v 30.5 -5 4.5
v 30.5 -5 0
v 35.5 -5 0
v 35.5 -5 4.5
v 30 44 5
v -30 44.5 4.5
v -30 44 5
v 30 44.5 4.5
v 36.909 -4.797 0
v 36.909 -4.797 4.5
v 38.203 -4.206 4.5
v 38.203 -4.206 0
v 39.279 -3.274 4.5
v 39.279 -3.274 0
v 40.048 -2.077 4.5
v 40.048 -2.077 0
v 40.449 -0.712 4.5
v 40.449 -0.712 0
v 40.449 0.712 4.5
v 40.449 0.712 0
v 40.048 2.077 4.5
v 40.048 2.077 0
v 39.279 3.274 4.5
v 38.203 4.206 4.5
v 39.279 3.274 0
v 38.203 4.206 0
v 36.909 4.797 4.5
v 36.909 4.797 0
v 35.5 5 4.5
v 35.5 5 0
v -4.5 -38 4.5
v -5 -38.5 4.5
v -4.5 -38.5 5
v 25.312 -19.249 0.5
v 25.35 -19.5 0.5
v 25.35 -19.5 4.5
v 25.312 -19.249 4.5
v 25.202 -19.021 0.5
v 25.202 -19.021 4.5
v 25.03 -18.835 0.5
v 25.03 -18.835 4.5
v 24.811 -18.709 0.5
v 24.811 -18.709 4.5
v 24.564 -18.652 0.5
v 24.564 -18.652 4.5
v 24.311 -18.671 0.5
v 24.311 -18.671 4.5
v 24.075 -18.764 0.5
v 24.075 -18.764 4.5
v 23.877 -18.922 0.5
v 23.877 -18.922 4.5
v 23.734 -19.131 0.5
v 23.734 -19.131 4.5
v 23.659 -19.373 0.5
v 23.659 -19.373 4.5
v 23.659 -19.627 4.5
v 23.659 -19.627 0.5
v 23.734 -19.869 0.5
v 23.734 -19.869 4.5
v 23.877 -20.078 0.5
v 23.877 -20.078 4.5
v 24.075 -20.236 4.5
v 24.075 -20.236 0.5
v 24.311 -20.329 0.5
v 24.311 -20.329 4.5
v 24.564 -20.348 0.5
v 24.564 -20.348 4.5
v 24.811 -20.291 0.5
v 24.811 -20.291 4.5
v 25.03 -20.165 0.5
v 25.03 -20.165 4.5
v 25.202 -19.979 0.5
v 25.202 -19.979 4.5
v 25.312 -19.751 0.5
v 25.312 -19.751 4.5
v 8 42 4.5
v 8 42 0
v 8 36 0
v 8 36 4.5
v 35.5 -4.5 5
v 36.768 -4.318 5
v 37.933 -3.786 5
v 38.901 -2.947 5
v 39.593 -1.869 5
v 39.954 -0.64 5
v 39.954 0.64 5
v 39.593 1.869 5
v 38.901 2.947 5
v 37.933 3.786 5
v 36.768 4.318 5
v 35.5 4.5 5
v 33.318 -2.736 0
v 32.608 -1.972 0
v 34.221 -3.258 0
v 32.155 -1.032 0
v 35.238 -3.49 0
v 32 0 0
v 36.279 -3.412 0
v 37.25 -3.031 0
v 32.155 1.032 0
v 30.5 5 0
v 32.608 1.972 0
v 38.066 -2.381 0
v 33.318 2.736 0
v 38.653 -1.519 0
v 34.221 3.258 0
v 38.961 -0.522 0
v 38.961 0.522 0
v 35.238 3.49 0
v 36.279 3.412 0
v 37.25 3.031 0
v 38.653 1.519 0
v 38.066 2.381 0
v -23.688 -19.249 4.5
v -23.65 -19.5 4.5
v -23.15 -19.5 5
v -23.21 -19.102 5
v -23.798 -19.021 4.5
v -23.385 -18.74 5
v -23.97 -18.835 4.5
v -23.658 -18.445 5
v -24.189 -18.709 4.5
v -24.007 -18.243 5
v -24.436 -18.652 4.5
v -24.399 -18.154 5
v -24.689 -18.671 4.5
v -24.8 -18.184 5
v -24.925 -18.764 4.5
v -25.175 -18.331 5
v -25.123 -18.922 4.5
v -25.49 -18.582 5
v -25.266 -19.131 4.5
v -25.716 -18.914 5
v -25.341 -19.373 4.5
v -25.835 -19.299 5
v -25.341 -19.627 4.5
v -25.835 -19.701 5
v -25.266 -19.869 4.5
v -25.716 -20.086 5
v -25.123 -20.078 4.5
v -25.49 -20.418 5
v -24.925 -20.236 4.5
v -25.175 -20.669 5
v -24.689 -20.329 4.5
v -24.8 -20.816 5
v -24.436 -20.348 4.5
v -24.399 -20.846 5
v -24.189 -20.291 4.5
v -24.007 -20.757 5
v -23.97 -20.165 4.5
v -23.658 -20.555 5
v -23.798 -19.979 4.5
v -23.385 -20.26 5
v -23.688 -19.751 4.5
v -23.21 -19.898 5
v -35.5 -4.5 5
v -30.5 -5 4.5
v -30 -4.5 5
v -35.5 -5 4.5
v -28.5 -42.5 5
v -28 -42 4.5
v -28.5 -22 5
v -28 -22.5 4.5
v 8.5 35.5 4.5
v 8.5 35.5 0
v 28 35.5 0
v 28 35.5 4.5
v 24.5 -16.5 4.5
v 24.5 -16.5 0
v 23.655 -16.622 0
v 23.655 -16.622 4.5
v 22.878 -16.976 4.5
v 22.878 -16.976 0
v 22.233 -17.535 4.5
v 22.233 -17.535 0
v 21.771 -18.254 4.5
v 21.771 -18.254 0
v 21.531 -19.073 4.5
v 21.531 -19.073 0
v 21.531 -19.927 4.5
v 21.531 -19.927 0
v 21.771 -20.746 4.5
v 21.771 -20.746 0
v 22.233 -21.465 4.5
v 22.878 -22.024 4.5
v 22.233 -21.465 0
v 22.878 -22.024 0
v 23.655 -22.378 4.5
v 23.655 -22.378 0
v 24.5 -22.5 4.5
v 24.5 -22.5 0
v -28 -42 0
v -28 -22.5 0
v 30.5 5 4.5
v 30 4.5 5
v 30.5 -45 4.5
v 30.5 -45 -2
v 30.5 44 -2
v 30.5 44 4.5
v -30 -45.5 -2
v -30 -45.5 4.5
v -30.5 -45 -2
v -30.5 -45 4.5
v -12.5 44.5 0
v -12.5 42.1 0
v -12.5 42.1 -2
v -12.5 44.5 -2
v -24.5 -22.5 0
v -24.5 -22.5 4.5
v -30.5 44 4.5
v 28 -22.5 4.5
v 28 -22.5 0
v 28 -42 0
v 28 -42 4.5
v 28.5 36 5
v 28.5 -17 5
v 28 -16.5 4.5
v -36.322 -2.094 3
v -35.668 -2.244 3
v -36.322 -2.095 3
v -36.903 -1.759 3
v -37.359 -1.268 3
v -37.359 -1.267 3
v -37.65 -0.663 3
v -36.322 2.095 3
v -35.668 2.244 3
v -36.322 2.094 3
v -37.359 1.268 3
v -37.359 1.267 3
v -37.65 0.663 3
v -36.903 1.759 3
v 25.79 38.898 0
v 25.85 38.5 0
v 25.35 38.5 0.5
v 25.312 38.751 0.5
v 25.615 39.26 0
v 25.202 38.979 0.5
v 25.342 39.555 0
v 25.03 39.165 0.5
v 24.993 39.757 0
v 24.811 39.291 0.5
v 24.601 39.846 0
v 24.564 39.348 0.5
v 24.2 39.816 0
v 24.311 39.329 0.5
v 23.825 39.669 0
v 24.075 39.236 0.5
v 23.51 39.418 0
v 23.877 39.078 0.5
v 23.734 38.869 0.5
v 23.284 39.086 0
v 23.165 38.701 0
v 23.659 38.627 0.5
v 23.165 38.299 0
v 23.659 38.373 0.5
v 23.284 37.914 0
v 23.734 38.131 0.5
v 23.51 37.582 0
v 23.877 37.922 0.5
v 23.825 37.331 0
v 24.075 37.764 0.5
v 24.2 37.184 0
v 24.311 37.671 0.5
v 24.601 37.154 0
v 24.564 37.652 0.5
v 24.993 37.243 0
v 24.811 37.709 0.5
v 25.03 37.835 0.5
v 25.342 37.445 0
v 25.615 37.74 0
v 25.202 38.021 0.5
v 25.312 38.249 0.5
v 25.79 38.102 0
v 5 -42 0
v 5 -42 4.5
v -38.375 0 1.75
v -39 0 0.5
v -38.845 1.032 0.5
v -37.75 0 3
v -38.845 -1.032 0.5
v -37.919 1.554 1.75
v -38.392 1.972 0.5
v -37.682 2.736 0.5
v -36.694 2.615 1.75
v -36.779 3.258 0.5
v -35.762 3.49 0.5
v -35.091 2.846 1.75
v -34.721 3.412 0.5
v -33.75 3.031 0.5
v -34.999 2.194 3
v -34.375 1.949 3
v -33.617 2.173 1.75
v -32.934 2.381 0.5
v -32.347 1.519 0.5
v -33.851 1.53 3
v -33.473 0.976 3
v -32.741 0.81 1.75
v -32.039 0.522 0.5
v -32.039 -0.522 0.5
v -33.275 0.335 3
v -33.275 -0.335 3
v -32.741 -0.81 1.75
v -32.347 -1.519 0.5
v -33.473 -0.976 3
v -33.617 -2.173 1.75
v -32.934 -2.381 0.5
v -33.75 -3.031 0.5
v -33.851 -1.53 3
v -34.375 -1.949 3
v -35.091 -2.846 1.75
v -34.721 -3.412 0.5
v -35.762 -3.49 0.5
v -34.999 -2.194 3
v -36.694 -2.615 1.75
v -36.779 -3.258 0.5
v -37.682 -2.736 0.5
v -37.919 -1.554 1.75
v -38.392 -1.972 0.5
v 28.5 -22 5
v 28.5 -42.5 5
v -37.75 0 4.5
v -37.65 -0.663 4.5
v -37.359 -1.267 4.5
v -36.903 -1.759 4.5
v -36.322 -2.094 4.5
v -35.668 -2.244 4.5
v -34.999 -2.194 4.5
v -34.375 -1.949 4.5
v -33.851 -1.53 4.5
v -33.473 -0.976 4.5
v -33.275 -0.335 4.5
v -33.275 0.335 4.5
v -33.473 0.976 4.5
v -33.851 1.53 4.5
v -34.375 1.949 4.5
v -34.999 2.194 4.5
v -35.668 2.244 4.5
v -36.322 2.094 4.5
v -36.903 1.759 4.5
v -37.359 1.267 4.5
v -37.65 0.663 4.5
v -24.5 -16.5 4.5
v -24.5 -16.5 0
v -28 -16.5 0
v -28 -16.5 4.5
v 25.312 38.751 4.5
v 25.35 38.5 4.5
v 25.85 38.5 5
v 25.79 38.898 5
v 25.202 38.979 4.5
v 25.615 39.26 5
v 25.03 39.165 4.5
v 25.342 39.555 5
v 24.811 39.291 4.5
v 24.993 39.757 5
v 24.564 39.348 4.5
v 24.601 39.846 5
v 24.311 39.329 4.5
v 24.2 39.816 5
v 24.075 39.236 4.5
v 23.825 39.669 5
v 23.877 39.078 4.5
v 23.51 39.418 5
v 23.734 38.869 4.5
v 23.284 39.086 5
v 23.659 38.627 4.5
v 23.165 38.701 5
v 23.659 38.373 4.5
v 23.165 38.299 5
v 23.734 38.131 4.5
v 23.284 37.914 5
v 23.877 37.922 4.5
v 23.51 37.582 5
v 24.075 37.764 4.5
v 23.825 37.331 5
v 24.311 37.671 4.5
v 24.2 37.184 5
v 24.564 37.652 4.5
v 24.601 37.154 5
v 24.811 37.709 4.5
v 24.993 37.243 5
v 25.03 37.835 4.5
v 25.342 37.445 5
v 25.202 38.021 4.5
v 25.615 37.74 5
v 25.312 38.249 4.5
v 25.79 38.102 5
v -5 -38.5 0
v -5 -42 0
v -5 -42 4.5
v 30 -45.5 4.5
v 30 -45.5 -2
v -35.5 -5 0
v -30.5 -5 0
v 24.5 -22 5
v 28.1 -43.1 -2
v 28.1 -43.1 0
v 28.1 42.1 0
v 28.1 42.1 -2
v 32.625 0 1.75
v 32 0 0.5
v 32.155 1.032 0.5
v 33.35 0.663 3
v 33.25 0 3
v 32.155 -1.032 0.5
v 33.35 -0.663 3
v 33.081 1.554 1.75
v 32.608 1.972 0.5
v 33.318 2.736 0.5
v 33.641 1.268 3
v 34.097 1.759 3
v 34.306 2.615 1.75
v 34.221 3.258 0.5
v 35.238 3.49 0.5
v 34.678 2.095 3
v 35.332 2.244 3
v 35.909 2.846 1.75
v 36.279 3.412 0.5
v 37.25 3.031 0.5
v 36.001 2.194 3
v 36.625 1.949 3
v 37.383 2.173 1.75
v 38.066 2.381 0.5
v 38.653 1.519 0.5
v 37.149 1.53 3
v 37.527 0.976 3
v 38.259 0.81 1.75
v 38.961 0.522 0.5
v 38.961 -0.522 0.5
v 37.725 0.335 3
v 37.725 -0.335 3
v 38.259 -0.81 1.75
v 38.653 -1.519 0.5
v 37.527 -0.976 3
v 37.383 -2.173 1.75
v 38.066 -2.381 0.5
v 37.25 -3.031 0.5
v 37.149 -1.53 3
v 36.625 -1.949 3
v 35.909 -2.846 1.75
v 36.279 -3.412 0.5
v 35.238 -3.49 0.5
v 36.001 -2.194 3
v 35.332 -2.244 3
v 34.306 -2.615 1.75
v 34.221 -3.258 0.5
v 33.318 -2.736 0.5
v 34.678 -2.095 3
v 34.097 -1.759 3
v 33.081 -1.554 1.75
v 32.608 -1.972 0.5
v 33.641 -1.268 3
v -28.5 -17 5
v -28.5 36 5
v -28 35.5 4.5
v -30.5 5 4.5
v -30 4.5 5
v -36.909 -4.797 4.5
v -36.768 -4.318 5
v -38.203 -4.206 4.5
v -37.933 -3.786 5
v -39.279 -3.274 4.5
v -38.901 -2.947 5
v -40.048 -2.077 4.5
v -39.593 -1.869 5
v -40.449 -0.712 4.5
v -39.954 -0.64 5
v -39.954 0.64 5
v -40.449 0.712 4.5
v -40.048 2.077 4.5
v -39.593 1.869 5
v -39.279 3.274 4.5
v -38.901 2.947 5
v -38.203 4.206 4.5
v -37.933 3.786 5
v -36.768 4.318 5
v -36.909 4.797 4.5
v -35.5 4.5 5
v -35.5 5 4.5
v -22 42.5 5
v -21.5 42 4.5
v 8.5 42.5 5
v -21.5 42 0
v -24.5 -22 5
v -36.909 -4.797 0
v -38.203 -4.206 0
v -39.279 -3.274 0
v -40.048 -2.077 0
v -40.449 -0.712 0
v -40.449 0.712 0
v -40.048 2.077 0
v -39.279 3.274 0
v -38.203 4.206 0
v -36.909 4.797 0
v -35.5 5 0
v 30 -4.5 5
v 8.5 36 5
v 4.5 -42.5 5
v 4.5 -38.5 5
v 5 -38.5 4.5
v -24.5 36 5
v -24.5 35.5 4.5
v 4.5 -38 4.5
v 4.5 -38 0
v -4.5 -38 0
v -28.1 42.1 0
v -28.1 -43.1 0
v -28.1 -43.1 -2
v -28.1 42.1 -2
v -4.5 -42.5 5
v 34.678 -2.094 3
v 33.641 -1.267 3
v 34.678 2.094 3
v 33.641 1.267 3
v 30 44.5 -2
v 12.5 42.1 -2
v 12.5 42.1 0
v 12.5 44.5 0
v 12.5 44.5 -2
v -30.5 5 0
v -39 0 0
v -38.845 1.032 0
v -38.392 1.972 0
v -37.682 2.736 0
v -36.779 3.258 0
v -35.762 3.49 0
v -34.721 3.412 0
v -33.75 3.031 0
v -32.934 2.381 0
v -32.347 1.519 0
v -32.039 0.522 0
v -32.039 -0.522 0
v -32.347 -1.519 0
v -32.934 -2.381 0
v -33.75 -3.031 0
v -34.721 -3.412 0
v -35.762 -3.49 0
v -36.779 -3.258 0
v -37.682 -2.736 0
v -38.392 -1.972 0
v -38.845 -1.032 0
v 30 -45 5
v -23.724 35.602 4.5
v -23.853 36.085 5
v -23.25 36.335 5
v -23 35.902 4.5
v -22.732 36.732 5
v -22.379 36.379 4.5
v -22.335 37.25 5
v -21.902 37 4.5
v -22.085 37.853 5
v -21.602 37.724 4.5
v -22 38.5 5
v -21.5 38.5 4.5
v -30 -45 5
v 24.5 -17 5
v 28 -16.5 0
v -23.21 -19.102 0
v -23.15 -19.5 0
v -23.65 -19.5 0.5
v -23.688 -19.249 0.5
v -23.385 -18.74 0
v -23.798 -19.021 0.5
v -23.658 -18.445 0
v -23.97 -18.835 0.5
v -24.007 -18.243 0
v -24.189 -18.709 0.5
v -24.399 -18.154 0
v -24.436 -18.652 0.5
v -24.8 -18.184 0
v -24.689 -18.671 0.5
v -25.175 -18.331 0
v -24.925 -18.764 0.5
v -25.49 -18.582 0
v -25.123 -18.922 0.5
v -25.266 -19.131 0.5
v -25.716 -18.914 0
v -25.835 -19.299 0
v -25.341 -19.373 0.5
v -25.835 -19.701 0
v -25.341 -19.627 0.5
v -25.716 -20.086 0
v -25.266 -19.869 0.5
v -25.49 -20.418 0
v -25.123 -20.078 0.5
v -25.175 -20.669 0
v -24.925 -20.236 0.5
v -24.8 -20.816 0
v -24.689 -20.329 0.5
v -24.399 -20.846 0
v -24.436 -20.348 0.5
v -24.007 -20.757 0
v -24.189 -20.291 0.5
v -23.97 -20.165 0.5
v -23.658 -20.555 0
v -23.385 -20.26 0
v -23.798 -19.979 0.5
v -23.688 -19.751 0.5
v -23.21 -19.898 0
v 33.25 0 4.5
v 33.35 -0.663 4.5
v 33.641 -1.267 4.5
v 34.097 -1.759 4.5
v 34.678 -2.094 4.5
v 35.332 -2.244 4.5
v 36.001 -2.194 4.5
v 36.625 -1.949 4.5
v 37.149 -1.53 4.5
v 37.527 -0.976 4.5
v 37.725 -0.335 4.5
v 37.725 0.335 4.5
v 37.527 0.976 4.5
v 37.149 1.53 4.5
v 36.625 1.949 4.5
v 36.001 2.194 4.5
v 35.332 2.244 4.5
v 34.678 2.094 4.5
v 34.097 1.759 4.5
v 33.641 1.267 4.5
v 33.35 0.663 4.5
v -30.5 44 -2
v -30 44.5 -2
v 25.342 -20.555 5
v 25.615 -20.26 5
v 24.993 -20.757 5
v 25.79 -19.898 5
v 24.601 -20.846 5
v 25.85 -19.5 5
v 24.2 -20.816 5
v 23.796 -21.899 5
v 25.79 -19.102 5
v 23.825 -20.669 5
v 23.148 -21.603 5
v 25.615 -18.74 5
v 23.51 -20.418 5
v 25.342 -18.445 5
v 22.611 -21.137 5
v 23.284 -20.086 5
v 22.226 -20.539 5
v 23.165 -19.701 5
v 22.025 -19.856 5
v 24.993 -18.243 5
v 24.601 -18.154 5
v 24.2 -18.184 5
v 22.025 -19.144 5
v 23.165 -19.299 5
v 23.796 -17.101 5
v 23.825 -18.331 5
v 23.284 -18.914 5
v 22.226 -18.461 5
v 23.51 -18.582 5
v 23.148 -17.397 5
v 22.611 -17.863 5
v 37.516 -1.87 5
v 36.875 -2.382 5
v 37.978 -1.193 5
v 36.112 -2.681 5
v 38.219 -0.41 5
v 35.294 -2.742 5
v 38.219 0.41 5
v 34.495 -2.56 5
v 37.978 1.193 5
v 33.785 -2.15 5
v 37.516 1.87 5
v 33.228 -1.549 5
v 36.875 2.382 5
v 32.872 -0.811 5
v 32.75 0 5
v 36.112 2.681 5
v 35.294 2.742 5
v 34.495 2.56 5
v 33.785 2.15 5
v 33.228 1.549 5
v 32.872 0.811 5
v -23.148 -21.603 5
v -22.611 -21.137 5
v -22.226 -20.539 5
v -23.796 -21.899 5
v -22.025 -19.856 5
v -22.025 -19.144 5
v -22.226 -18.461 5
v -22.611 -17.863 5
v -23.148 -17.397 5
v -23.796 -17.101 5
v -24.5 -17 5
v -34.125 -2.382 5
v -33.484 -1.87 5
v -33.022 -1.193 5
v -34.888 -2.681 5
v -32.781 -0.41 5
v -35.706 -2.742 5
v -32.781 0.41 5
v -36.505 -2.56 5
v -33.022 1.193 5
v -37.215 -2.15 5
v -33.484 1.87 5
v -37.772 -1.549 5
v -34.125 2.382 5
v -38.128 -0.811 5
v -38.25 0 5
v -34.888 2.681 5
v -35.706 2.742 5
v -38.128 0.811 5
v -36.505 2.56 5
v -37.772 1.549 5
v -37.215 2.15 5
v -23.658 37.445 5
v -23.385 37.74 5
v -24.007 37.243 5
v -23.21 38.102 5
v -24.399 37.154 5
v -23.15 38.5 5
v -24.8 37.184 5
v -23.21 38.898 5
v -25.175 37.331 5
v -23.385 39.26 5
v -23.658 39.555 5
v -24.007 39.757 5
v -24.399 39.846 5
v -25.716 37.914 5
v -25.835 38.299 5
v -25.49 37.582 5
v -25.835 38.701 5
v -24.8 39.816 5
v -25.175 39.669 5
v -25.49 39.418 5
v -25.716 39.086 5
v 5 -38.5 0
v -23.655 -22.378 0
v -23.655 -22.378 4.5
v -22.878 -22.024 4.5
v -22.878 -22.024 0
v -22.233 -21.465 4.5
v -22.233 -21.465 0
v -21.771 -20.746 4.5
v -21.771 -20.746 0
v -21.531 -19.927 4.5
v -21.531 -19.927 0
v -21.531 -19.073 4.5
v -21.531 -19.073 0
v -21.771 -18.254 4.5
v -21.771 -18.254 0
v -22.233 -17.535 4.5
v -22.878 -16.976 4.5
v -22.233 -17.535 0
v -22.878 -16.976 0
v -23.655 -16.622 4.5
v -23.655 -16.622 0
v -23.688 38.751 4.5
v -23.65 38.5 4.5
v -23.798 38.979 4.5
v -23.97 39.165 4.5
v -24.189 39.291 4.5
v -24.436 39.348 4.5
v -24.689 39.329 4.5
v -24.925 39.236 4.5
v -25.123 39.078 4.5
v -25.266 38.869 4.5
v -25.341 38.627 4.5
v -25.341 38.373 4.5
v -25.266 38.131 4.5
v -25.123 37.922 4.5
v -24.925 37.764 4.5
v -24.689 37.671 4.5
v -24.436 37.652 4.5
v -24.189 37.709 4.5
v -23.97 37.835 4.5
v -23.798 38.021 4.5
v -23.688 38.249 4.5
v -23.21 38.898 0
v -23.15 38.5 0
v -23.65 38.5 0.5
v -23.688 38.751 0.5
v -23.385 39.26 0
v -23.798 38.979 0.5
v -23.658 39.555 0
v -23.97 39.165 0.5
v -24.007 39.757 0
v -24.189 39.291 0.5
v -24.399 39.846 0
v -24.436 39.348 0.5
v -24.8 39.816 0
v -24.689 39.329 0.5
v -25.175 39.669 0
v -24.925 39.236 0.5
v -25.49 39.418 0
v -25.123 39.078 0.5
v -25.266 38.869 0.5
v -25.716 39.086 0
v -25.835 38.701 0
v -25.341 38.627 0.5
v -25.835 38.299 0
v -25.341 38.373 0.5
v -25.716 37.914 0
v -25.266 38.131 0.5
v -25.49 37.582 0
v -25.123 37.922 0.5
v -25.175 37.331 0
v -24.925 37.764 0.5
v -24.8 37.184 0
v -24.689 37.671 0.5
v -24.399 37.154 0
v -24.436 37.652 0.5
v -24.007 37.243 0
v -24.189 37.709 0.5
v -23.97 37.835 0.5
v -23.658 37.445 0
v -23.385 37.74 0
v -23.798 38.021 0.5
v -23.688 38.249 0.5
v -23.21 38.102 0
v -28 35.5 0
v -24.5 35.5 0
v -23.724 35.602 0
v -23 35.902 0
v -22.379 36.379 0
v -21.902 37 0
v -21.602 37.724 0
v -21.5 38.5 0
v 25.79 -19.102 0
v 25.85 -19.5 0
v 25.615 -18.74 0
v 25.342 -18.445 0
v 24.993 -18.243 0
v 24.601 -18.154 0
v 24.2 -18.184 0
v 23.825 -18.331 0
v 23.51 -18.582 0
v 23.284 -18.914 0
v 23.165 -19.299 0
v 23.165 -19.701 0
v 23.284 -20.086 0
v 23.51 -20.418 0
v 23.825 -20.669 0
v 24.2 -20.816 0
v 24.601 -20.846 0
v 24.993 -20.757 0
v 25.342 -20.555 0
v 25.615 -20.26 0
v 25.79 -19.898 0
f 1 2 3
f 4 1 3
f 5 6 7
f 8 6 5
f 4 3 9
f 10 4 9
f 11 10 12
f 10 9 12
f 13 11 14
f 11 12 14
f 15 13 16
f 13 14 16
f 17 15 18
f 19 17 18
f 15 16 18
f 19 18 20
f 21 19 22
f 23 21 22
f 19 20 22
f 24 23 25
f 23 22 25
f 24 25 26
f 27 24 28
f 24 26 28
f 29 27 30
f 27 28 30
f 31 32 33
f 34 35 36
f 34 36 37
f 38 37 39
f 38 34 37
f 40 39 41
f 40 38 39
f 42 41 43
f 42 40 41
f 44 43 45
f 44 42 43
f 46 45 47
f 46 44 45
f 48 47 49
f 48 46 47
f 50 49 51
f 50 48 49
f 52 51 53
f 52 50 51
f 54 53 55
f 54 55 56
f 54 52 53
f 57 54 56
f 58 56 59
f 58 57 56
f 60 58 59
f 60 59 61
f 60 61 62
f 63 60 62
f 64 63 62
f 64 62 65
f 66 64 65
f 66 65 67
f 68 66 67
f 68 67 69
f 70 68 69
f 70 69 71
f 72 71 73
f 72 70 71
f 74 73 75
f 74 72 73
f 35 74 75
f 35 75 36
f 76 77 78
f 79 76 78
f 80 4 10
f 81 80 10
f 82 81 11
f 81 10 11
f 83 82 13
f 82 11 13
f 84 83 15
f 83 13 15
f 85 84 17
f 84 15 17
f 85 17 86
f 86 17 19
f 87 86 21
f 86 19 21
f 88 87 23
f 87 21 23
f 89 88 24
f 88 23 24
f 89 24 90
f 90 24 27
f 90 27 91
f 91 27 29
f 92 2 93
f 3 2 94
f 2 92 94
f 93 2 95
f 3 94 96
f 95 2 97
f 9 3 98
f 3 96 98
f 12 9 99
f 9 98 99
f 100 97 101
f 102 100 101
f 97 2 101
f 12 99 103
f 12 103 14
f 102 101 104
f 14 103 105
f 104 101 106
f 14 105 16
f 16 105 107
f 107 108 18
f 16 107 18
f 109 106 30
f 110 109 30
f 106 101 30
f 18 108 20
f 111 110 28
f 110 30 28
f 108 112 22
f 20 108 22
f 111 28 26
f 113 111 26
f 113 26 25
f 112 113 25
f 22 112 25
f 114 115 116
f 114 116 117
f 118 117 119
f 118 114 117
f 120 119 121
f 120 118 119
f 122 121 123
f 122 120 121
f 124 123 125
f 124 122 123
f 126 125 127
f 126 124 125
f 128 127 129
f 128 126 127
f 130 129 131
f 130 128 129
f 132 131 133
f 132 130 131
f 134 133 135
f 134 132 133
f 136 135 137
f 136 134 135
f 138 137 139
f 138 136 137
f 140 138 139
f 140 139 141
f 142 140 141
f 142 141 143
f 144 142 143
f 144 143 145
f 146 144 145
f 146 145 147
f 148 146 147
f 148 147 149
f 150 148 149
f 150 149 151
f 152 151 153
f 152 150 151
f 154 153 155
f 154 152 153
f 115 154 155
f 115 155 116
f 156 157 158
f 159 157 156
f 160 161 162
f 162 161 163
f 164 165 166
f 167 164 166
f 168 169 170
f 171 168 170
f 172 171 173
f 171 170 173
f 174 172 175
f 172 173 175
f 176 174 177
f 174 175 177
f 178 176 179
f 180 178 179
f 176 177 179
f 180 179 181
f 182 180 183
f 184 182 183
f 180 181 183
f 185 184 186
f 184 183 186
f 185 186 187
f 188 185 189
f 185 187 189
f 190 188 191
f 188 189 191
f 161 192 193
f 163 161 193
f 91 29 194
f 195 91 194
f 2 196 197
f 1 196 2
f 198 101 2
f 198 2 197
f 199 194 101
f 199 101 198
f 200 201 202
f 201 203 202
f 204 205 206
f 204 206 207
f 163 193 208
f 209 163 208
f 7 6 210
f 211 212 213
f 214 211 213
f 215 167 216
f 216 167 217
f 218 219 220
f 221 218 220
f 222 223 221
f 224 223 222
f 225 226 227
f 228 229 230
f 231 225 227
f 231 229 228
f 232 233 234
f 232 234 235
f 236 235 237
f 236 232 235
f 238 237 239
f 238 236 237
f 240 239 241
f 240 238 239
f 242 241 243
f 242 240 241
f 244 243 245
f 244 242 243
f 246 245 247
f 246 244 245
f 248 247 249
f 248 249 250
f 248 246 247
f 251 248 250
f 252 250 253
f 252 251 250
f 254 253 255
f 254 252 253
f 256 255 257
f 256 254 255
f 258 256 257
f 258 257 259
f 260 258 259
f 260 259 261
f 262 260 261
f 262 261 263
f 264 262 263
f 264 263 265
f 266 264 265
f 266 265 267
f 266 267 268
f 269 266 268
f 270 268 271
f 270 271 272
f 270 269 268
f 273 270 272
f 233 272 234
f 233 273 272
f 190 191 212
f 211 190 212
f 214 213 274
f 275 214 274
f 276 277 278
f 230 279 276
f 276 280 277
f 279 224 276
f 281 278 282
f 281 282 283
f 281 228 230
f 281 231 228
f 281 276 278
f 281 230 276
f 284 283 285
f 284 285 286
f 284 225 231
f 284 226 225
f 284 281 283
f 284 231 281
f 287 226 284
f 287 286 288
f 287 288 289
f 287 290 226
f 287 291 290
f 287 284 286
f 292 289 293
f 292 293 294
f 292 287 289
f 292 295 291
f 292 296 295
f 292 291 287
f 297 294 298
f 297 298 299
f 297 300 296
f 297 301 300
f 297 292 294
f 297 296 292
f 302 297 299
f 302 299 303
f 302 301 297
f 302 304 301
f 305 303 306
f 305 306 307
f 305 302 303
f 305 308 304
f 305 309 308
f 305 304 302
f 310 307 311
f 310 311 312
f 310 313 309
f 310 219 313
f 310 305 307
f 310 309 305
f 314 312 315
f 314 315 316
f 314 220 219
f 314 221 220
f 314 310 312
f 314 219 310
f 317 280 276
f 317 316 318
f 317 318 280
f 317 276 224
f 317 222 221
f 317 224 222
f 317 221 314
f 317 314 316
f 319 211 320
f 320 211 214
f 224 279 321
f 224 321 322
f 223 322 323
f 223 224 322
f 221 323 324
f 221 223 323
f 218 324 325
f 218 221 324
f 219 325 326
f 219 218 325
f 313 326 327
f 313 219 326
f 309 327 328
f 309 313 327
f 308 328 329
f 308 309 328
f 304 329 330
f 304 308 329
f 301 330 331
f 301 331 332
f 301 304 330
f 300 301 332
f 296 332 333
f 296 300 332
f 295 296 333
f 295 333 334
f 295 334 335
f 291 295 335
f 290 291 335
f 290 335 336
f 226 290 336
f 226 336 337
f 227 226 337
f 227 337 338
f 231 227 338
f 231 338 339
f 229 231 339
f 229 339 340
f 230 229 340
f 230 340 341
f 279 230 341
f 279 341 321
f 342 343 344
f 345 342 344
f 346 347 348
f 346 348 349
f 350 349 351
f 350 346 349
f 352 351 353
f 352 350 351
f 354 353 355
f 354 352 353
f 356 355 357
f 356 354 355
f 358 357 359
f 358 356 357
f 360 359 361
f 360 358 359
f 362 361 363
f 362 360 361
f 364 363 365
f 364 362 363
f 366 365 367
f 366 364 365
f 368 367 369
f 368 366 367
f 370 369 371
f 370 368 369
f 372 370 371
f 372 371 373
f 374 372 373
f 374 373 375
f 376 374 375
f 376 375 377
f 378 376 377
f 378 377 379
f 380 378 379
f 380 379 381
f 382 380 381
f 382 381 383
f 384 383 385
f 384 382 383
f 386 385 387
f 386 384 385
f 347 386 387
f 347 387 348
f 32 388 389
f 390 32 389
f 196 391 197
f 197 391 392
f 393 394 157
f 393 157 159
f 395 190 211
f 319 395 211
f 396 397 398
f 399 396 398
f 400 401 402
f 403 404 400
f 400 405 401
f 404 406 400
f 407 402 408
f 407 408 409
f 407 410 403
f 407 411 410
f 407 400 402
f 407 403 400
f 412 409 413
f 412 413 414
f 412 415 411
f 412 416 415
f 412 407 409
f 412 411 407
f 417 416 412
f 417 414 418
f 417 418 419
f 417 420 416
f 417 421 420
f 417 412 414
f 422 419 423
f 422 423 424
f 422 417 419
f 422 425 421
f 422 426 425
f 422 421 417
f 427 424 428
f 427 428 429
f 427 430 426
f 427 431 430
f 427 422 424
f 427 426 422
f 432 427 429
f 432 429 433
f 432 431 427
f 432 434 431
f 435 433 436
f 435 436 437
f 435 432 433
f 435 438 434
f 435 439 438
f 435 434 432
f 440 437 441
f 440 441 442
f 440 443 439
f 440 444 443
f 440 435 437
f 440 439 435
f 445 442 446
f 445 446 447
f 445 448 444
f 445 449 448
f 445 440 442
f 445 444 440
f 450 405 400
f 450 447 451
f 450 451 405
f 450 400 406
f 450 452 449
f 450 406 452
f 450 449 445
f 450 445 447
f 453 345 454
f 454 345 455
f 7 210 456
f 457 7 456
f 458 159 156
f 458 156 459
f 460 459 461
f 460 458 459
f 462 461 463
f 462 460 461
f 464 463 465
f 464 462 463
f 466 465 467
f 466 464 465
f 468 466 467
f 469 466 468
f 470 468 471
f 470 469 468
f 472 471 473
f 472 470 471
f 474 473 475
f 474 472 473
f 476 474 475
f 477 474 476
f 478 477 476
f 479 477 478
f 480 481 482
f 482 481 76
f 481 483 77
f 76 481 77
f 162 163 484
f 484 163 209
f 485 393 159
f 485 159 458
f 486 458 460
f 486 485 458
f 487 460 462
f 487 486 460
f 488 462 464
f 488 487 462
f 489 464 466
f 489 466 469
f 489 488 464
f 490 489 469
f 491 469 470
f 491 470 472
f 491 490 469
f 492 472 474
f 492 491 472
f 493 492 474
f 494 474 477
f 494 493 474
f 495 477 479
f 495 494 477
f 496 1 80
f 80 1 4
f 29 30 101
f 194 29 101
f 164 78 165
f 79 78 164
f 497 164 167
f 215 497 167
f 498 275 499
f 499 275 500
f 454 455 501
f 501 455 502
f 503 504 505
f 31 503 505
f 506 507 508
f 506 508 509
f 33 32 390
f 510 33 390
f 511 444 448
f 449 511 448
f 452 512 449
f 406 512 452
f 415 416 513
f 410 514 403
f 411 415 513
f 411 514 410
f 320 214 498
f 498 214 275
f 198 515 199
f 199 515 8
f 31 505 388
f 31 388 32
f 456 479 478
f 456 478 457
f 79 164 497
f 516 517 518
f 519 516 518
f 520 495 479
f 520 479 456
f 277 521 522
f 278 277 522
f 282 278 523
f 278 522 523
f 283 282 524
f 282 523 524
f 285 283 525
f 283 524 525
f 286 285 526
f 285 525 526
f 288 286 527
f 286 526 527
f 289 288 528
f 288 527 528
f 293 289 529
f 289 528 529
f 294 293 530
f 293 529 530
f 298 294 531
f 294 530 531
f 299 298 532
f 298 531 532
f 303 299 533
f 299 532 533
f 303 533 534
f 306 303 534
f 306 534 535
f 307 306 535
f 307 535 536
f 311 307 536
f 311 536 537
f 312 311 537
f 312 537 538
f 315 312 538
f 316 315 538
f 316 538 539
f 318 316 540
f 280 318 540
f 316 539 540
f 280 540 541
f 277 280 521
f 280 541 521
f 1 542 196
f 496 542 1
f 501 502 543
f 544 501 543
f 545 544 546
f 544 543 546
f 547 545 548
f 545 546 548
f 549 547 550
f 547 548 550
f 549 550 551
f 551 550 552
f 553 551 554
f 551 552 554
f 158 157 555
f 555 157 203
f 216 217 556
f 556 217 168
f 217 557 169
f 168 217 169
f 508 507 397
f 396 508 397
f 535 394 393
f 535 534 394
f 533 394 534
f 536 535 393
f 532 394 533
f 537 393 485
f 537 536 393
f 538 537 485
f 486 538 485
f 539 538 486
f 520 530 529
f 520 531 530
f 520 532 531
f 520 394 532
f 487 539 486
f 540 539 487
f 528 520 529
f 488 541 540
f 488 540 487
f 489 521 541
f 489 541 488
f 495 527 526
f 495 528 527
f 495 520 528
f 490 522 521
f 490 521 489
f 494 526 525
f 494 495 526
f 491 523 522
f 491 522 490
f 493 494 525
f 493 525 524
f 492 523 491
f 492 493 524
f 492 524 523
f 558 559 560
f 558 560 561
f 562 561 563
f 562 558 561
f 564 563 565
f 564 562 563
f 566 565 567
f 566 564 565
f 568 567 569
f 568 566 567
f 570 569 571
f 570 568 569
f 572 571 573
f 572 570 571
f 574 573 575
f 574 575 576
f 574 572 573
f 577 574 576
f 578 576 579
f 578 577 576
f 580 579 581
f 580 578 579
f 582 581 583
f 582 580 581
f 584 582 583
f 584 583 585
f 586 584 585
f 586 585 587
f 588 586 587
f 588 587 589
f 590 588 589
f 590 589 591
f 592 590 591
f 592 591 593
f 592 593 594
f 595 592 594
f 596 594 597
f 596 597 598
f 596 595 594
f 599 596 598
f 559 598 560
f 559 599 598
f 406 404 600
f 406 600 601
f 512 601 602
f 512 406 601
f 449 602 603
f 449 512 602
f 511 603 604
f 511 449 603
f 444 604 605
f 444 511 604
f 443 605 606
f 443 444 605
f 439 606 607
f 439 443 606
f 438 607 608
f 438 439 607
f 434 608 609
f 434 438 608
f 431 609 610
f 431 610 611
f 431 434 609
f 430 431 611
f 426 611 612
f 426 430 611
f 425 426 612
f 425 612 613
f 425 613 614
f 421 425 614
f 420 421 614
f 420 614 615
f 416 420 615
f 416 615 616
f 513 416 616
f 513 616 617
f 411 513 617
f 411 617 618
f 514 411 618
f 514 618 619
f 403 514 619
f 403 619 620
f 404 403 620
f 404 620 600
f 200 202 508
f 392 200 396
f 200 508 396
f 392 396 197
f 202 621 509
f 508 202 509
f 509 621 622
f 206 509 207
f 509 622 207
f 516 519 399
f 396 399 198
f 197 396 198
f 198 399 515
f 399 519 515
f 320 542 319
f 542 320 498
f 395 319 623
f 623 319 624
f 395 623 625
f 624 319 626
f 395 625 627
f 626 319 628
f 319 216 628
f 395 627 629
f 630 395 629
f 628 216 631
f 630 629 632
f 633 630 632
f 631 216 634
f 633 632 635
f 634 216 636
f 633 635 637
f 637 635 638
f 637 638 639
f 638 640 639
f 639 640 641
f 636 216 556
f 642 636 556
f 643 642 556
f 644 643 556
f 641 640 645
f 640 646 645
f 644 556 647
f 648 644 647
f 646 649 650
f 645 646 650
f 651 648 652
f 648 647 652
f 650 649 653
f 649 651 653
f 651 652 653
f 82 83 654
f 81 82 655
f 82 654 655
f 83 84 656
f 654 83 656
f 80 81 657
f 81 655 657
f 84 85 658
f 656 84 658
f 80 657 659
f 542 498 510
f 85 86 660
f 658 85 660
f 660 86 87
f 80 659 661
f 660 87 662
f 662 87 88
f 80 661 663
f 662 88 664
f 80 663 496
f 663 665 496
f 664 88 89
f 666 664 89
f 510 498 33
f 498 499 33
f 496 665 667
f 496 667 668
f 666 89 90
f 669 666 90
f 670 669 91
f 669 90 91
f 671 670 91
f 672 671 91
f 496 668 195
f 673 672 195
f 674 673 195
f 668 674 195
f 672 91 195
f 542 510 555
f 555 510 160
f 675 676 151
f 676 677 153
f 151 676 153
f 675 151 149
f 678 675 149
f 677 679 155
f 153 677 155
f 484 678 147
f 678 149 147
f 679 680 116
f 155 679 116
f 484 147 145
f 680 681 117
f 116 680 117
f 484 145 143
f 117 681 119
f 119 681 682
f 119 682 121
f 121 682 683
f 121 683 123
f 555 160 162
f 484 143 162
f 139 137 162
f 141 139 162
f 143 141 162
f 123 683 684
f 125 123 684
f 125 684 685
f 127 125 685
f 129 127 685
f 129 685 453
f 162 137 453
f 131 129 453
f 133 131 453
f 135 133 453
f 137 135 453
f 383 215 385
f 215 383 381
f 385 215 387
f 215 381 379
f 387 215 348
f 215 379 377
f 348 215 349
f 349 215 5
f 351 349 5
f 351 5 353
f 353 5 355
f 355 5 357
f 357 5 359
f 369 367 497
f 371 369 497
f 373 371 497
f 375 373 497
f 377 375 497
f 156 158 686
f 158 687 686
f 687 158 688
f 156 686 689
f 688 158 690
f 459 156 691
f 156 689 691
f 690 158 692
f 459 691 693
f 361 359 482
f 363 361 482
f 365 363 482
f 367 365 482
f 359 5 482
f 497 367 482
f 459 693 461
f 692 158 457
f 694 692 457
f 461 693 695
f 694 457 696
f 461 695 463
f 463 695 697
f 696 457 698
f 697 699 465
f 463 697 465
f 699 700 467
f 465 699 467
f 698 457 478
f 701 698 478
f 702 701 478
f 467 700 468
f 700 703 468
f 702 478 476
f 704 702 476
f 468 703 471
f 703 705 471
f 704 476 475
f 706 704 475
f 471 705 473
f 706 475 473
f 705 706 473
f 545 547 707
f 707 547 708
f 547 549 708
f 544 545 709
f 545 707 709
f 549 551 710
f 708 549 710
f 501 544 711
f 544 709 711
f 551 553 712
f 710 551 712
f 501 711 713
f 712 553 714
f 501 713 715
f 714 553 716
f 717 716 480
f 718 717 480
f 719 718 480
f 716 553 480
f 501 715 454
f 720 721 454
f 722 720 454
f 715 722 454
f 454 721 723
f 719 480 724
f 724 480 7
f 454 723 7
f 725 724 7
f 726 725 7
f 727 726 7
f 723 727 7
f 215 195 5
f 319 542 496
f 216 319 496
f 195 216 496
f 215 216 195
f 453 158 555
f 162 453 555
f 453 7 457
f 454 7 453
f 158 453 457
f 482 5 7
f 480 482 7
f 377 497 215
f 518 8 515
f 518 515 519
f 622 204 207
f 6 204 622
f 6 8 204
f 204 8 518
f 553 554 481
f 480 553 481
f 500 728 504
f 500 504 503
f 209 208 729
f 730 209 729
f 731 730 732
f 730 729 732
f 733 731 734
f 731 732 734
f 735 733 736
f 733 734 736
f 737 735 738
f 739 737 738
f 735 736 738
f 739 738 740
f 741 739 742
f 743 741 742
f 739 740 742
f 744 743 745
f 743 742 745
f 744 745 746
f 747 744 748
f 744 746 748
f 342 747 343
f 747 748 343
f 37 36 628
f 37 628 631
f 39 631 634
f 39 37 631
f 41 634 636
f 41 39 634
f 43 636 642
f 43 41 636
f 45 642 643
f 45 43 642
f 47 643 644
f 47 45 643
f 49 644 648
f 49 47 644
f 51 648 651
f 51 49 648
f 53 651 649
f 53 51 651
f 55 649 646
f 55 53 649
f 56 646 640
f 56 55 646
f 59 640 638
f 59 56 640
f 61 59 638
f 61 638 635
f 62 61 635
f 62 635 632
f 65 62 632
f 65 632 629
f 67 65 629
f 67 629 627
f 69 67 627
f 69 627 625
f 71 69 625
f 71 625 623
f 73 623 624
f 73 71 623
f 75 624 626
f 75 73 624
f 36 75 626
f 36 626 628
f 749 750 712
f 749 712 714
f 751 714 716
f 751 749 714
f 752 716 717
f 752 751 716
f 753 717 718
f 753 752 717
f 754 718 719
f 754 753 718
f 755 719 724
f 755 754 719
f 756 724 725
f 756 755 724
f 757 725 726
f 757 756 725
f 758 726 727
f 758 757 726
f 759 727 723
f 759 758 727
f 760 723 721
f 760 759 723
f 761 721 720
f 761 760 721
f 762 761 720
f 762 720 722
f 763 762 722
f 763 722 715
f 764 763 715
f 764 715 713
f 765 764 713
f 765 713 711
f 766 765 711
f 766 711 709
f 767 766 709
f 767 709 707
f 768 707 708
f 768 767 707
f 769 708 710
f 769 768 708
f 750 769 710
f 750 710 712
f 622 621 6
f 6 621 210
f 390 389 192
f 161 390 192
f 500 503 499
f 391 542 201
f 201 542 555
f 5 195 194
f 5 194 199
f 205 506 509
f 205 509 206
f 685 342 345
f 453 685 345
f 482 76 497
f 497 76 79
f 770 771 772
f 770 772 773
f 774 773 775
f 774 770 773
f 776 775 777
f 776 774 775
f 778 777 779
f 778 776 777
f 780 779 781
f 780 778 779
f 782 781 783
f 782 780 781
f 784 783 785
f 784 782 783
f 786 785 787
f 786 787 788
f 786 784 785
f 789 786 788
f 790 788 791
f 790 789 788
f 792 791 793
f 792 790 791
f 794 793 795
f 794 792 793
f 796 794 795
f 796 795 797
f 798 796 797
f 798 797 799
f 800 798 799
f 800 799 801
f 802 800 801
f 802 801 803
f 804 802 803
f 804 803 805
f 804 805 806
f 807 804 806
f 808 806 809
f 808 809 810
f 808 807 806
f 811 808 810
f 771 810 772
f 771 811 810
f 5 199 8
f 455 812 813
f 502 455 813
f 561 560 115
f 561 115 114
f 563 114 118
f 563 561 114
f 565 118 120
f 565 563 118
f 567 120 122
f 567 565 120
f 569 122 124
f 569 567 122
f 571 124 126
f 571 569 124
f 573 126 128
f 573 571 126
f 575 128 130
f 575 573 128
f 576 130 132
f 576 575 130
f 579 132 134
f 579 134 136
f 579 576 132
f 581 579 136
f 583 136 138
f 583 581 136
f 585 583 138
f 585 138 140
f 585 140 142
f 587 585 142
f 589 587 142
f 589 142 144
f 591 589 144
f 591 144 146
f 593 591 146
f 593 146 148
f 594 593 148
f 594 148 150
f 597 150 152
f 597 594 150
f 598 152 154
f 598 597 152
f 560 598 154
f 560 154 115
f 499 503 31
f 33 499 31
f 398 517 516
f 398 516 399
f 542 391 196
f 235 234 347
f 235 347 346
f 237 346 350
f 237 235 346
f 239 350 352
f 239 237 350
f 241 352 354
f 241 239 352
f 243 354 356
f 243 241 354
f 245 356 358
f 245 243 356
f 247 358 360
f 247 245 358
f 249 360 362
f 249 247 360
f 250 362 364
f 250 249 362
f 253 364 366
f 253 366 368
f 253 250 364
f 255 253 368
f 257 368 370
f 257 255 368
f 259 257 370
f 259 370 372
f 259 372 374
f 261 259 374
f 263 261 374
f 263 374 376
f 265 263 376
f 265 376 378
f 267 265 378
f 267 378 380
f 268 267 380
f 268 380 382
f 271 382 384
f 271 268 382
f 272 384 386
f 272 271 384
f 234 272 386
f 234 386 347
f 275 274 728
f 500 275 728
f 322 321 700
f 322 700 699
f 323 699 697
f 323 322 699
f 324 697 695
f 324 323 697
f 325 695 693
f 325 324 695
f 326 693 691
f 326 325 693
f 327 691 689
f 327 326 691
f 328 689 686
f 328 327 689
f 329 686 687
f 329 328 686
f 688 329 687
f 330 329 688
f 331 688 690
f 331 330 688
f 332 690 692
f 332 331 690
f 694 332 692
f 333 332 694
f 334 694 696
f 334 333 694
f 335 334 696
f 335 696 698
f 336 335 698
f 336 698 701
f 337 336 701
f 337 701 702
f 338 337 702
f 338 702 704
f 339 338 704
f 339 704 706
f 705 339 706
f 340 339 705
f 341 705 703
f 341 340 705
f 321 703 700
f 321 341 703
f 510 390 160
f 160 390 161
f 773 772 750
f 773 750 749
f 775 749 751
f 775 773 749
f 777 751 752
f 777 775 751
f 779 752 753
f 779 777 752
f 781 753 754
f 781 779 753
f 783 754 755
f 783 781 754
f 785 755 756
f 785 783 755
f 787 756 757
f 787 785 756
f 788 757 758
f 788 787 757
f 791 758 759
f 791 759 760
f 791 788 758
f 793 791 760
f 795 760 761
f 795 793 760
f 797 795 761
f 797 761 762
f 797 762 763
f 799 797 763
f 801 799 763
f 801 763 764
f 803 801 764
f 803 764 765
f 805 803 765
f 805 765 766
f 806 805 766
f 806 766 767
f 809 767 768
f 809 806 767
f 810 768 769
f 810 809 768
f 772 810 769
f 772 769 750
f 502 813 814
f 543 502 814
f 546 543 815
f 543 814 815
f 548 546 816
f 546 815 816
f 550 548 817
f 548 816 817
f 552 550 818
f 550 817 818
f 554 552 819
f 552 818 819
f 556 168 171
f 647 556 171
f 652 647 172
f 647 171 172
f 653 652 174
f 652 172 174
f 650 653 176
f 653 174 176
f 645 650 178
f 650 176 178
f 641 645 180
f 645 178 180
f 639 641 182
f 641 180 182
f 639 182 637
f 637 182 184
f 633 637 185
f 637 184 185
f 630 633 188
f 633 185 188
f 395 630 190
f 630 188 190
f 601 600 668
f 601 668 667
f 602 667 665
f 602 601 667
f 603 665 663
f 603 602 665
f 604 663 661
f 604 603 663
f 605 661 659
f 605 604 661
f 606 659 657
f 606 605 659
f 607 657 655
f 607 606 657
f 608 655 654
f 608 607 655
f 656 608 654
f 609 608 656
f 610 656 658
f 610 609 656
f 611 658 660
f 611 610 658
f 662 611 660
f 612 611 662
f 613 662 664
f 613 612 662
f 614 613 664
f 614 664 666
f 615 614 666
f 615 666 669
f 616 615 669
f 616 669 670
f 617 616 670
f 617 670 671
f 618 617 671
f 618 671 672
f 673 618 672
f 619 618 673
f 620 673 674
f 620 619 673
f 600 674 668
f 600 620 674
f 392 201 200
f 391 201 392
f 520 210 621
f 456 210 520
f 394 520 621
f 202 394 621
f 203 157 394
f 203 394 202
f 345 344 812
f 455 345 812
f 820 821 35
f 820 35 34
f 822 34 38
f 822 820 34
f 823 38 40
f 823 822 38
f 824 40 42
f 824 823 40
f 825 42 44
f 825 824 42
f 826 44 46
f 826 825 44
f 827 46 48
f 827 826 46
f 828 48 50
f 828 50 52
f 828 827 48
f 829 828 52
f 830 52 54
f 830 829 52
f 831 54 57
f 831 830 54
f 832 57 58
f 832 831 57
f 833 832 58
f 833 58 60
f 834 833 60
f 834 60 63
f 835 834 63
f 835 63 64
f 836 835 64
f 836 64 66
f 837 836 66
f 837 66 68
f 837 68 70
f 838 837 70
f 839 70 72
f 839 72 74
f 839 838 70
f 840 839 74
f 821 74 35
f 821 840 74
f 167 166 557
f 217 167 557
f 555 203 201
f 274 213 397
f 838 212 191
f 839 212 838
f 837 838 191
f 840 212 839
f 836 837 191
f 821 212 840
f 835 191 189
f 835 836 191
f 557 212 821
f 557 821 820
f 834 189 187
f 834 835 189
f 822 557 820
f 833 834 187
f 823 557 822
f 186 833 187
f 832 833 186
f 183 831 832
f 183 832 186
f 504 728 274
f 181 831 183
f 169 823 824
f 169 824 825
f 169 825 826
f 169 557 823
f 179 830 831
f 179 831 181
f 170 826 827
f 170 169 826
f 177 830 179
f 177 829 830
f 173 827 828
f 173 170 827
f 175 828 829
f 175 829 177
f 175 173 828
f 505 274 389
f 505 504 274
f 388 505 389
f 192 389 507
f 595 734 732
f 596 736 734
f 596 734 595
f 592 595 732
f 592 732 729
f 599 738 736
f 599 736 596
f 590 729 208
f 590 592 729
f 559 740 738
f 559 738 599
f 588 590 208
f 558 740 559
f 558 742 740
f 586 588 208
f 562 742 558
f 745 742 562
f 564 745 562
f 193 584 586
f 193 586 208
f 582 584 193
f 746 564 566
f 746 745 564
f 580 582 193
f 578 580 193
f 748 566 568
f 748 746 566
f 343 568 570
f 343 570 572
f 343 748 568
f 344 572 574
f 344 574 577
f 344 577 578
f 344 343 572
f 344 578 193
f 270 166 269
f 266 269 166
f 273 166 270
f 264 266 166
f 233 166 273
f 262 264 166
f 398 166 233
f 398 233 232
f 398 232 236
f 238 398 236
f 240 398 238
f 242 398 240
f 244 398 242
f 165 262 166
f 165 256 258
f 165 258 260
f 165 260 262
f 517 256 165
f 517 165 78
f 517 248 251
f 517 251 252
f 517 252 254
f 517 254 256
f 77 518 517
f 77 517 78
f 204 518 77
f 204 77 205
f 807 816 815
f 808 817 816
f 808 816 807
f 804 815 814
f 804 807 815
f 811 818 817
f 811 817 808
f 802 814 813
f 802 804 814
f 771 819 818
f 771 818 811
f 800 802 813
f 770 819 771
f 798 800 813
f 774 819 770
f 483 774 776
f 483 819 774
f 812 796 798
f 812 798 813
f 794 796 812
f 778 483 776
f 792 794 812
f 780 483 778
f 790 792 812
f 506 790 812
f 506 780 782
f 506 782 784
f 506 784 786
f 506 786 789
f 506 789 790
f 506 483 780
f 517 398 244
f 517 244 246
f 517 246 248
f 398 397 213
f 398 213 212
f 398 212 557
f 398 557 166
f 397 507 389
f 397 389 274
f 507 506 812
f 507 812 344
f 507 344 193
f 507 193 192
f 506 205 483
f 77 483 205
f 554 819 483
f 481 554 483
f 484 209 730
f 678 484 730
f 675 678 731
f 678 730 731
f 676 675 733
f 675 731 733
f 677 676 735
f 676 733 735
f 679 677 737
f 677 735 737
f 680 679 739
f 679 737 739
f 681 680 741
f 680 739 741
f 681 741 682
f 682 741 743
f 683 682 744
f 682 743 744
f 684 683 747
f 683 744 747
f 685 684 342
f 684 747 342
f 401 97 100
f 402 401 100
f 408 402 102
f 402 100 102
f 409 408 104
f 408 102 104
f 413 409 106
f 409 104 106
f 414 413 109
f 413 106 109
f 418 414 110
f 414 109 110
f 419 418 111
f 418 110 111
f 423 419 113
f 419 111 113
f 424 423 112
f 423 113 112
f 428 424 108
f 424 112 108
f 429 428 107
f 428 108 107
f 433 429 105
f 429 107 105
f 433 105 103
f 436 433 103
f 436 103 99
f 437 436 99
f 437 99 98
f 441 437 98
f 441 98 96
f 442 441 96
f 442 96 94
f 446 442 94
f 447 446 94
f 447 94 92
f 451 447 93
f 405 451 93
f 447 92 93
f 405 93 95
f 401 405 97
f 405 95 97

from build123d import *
from OCP.BRepFilletAPI import BRepFilletAPI_MakeChamfer

# Parameters (mm, degrees)
SKETCH1_R           = 0.85
BOSS_EXTRUDE1_DEPTH = 5
SKETCH2_W           = 56.2
SKETCH2_H           = 85.2
BOSS_EXTRUDE2_DEPTH = 2
SKETCH3_R           = 2.25
BOSS_EXTRUDE3_DEPTH = 5
SKETCH4_R           = 3.5
CUT_EXTRUDE1_DEPTH  = 3
SKETCH5_W           = 25
SKETCH5_H           = 2.4
CUT_EXTRUDE2_DEPTH  = 62.118736898
CHAMFER3_SIZE       = 0.5
CHAMFER1_SIZE       = 2.5
CHAMFER1_SIZE_2     = 1.25


with BuildPart() as part:
    # Sketch1 → Boss-Extrude1 (new body)
    with BuildSketch(Plane.XY):
        Polygon((-30.5, -43), (-30.5, 44.5), (30.5, 44.5), (30.5, -43), (30.5, -45.5), (-30.5, -45.5), align=None)
        with Locations((-24.5, 38.5)):
            Circle(SKETCH1_R, mode=Mode.SUBTRACT)
        with Locations((24.5, 38.5)):
            Circle(SKETCH1_R, mode=Mode.SUBTRACT)
        with Locations((24.5, -19.5)):
            Circle(SKETCH1_R, mode=Mode.SUBTRACT)
        with Locations((-24.5, -19.5)):
            Circle(SKETCH1_R, mode=Mode.SUBTRACT)
        with BuildLine():
            Line((-21.5, 38.5), (-21.5, 42))
            Line((-21.5, 42), (8, 42))
            Line((8, 42), (8, 35.5))
            Line((8, 35.5), (24.5, 35.5))
            Line((24.5, 35.5), (28, 35.5))
            Line((28, 35.5), (28, -16.5))
            Line((28, -16.5), (24.5, -16.5))
            ThreePointArc((24.5, -16.5), (21.5, -19.5), (24.5, -22.5))
            Line((24.5, -22.5), (28, -22.5))
            Line((28, -22.5), (28, -42))
            Line((28, -42), (5, -42))
            Line((5, -42), (5, -38))
            Line((5, -38), (0, -38))
            Line((0, -38), (-5, -38))
            Line((-5, -38), (-5, -42))
            Line((-5, -42), (-28, -42))
            Line((-28, -42), (-28, -22.5))
            Line((-28, -22.5), (-24.5, -22.5))
            ThreePointArc((-24.5, -22.5), (-21.5, -19.5), (-24.5, -16.5))
            Line((-24.5, -16.5), (-28, -16.5))
            Line((-28, -16.5), (-28, 35.5))
            Line((-28, 35.5), (-24.5, 35.5))
            ThreePointArc((-24.5, 35.5), (-22.378679656, 36.378679656), (-21.5, 38.5))
        make_face(mode=Mode.SUBTRACT)
    extrude(amount=BOSS_EXTRUDE1_DEPTH)

    # Sketch2 → Boss-Extrude2 (add)
    with BuildSketch(Plane.XY):
        Polygon((30.5, -45.5), (30.5, 44.5), (-30.5, 44.5), (-30.5, -45.5), (-28.1, -45.5), (28.1, -45.5), align=None)
        with Locations((0, -0.5)):
            Rectangle(SKETCH2_W, SKETCH2_H, mode=Mode.SUBTRACT)
    extrude(amount=-BOSS_EXTRUDE2_DEPTH)

    # Sketch3 → Boss-Extrude3 (add)
    # profile 1 of 2: a face of its own
    with BuildSketch(Plane.XY):
        with BuildLine():
            Line((35.5, 5), (30.5, 5))
            Line((30.5, 5), (30.5, -5))
            Line((30.5, -5), (35.5, -5))
            ThreePointArc((35.5, -5), (40.5, 0), (35.5, 5))
        make_face()
        with Locations(Location((35.5, 0, 0), (0, 0, 180))):
            Circle(SKETCH3_R, mode=Mode.SUBTRACT)
    # profile 2 of 2: a face of its own
    with BuildSketch(Plane.XY):
        with BuildLine():
            Line((-35.5, 5), (-30.5, 5))
            Line((-30.5, 5), (-30.5, -5))
            Line((-30.5, -5), (-35.5, -5))
            ThreePointArc((-35.5, -5), (-40.5, 0), (-35.5, 5))
        make_face()
        with Locations(Location((-35.5, 0, 0), (0, 0, 180))):
            Circle(SKETCH3_R, mode=Mode.SUBTRACT)
    extrude(amount=BOSS_EXTRUDE3_DEPTH)

    # Sketch4 → Cut-Extrude1 (cut)
    with BuildSketch(Plane(origin=(0, 0, 0), x_dir=(-1, 0, 0), z_dir=(0, 0, -1))):
        with Locations((-35.5, 0)):
            Circle(SKETCH4_R)
        with Locations((35.5, 0)):
            Circle(SKETCH4_R)
    extrude(amount=-CUT_EXTRUDE1_DEPTH, mode=Mode.SUBTRACT)

    # Sketch5 → Cut-Extrude2 (cut, through all)
    with BuildSketch(Plane(origin=(0, 0, 0), x_dir=(-1, 0, 0), z_dir=(0, 0, -1))):
        with Locations((0, 43.3)):
            Rectangle(SKETCH5_W, SKETCH5_H)
    extrude(amount=CUT_EXTRUDE2_DEPTH, mode=Mode.SUBTRACT)

    # Chamfer3
    chamfer3_edges = [part.edges().sort_by_distance(p)[0] for p in [
        (30.5, 44.5, 1.5),
        (30.5, -45.5, 1.5),
        (-30.5, -45.5, 1.5),
        (-30.5, 44.5, 1.5),
        (30.5, 24.75, 5),
        (40.5, 0, 5),
        (33, 5, 5),
        (33, -5, 5),
        (37.75, 0, 5),
        (-30.5, -25.25, 5),
        (-40.5, 0, 5),
        (-33, -5, 5),
        (-33, 5, 5),
        (-33.25, 0, 5),
        (0, -45.5, 5),
        (-25.35, 38.5, 0),
        (-25.35, 38.5, 5),
        (30.5, -25.25, 5),
        (23.65, 38.5, 0),
        (23.65, 38.5, 5),
        (-5, -38, 2.5),
        (5, -38, 2.5),
        (0, 44.5, 5),
        (8, 35.5, 2.5),
        (-22.378679656, 36.378679656, 5),
        (-26.25, 35.5, 5),
        (-28, 9.5, 5),
        (-26.25, -16.5, 5),
        (-21.5, -19.5, 5),
        (-26.25, -22.5, 5),
        (-28, -32.25, 5),
        (-16.5, -42, 5),
        (-5, -40, 5),
        (0, -38, 5),
        (5, -40, 5),
        (16.5, -42, 5),
        (28, -32.25, 5),
        (26.25, -22.5, 5),
        (21.5, -19.5, 5),
        (26.25, -16.5, 5),
        (28, 9.5, 5),
        (18, 35.5, 5),
        (8, 38.75, 5),
        (-6.75, 42, 5),
        (-21.5, 40.25, 5),
        (23.65, -19.5, 0),
        (23.65, -19.5, 5),
        (-25.35, -19.5, 0),
        (-25.35, -19.5, 5),
        (-30.5, 24.75, 5),
    ]]
    chamfer(chamfer3_edges, length=CHAMFER3_SIZE)

    # Chamfer1
    chamfer1_edges_1 = [part.edges().sort_by_distance(p)[0] for p in [
        (39, 0, 3),
    ]]
    chamfer1_side_1 = [part.faces().sort_by_distance(p)[0] for p in [
        (39, 0, 2.975),
    ]]
    chamfer1_edges_2 = [part.edges().sort_by_distance(p)[0] for p in [
        (-32, 0, 3),
    ]]
    chamfer1_side_2 = [part.faces().sort_by_distance(p)[0] for p in [
        (-32, 0, 2.975),
    ]]
    chamfer1 = BRepFilletAPI_MakeChamfer(part.part.solid().wrapped)
    for e in chamfer1_edges_1:
        chamfer1.Add(CHAMFER1_SIZE - 0.0001, CHAMFER1_SIZE_2 - 0.0001, e.wrapped, chamfer1_side_1[0].wrapped)
    for e in chamfer1_edges_2:
        chamfer1.Add(CHAMFER1_SIZE - 0.0001, CHAMFER1_SIZE_2 - 0.0001, e.wrapped, chamfer1_side_2[0].wrapped)
    add(Compound.cast(chamfer1.Shape()), mode=Mode.REPLACE)  # a hair under: the kernel refuses the full size


solid = part.part
